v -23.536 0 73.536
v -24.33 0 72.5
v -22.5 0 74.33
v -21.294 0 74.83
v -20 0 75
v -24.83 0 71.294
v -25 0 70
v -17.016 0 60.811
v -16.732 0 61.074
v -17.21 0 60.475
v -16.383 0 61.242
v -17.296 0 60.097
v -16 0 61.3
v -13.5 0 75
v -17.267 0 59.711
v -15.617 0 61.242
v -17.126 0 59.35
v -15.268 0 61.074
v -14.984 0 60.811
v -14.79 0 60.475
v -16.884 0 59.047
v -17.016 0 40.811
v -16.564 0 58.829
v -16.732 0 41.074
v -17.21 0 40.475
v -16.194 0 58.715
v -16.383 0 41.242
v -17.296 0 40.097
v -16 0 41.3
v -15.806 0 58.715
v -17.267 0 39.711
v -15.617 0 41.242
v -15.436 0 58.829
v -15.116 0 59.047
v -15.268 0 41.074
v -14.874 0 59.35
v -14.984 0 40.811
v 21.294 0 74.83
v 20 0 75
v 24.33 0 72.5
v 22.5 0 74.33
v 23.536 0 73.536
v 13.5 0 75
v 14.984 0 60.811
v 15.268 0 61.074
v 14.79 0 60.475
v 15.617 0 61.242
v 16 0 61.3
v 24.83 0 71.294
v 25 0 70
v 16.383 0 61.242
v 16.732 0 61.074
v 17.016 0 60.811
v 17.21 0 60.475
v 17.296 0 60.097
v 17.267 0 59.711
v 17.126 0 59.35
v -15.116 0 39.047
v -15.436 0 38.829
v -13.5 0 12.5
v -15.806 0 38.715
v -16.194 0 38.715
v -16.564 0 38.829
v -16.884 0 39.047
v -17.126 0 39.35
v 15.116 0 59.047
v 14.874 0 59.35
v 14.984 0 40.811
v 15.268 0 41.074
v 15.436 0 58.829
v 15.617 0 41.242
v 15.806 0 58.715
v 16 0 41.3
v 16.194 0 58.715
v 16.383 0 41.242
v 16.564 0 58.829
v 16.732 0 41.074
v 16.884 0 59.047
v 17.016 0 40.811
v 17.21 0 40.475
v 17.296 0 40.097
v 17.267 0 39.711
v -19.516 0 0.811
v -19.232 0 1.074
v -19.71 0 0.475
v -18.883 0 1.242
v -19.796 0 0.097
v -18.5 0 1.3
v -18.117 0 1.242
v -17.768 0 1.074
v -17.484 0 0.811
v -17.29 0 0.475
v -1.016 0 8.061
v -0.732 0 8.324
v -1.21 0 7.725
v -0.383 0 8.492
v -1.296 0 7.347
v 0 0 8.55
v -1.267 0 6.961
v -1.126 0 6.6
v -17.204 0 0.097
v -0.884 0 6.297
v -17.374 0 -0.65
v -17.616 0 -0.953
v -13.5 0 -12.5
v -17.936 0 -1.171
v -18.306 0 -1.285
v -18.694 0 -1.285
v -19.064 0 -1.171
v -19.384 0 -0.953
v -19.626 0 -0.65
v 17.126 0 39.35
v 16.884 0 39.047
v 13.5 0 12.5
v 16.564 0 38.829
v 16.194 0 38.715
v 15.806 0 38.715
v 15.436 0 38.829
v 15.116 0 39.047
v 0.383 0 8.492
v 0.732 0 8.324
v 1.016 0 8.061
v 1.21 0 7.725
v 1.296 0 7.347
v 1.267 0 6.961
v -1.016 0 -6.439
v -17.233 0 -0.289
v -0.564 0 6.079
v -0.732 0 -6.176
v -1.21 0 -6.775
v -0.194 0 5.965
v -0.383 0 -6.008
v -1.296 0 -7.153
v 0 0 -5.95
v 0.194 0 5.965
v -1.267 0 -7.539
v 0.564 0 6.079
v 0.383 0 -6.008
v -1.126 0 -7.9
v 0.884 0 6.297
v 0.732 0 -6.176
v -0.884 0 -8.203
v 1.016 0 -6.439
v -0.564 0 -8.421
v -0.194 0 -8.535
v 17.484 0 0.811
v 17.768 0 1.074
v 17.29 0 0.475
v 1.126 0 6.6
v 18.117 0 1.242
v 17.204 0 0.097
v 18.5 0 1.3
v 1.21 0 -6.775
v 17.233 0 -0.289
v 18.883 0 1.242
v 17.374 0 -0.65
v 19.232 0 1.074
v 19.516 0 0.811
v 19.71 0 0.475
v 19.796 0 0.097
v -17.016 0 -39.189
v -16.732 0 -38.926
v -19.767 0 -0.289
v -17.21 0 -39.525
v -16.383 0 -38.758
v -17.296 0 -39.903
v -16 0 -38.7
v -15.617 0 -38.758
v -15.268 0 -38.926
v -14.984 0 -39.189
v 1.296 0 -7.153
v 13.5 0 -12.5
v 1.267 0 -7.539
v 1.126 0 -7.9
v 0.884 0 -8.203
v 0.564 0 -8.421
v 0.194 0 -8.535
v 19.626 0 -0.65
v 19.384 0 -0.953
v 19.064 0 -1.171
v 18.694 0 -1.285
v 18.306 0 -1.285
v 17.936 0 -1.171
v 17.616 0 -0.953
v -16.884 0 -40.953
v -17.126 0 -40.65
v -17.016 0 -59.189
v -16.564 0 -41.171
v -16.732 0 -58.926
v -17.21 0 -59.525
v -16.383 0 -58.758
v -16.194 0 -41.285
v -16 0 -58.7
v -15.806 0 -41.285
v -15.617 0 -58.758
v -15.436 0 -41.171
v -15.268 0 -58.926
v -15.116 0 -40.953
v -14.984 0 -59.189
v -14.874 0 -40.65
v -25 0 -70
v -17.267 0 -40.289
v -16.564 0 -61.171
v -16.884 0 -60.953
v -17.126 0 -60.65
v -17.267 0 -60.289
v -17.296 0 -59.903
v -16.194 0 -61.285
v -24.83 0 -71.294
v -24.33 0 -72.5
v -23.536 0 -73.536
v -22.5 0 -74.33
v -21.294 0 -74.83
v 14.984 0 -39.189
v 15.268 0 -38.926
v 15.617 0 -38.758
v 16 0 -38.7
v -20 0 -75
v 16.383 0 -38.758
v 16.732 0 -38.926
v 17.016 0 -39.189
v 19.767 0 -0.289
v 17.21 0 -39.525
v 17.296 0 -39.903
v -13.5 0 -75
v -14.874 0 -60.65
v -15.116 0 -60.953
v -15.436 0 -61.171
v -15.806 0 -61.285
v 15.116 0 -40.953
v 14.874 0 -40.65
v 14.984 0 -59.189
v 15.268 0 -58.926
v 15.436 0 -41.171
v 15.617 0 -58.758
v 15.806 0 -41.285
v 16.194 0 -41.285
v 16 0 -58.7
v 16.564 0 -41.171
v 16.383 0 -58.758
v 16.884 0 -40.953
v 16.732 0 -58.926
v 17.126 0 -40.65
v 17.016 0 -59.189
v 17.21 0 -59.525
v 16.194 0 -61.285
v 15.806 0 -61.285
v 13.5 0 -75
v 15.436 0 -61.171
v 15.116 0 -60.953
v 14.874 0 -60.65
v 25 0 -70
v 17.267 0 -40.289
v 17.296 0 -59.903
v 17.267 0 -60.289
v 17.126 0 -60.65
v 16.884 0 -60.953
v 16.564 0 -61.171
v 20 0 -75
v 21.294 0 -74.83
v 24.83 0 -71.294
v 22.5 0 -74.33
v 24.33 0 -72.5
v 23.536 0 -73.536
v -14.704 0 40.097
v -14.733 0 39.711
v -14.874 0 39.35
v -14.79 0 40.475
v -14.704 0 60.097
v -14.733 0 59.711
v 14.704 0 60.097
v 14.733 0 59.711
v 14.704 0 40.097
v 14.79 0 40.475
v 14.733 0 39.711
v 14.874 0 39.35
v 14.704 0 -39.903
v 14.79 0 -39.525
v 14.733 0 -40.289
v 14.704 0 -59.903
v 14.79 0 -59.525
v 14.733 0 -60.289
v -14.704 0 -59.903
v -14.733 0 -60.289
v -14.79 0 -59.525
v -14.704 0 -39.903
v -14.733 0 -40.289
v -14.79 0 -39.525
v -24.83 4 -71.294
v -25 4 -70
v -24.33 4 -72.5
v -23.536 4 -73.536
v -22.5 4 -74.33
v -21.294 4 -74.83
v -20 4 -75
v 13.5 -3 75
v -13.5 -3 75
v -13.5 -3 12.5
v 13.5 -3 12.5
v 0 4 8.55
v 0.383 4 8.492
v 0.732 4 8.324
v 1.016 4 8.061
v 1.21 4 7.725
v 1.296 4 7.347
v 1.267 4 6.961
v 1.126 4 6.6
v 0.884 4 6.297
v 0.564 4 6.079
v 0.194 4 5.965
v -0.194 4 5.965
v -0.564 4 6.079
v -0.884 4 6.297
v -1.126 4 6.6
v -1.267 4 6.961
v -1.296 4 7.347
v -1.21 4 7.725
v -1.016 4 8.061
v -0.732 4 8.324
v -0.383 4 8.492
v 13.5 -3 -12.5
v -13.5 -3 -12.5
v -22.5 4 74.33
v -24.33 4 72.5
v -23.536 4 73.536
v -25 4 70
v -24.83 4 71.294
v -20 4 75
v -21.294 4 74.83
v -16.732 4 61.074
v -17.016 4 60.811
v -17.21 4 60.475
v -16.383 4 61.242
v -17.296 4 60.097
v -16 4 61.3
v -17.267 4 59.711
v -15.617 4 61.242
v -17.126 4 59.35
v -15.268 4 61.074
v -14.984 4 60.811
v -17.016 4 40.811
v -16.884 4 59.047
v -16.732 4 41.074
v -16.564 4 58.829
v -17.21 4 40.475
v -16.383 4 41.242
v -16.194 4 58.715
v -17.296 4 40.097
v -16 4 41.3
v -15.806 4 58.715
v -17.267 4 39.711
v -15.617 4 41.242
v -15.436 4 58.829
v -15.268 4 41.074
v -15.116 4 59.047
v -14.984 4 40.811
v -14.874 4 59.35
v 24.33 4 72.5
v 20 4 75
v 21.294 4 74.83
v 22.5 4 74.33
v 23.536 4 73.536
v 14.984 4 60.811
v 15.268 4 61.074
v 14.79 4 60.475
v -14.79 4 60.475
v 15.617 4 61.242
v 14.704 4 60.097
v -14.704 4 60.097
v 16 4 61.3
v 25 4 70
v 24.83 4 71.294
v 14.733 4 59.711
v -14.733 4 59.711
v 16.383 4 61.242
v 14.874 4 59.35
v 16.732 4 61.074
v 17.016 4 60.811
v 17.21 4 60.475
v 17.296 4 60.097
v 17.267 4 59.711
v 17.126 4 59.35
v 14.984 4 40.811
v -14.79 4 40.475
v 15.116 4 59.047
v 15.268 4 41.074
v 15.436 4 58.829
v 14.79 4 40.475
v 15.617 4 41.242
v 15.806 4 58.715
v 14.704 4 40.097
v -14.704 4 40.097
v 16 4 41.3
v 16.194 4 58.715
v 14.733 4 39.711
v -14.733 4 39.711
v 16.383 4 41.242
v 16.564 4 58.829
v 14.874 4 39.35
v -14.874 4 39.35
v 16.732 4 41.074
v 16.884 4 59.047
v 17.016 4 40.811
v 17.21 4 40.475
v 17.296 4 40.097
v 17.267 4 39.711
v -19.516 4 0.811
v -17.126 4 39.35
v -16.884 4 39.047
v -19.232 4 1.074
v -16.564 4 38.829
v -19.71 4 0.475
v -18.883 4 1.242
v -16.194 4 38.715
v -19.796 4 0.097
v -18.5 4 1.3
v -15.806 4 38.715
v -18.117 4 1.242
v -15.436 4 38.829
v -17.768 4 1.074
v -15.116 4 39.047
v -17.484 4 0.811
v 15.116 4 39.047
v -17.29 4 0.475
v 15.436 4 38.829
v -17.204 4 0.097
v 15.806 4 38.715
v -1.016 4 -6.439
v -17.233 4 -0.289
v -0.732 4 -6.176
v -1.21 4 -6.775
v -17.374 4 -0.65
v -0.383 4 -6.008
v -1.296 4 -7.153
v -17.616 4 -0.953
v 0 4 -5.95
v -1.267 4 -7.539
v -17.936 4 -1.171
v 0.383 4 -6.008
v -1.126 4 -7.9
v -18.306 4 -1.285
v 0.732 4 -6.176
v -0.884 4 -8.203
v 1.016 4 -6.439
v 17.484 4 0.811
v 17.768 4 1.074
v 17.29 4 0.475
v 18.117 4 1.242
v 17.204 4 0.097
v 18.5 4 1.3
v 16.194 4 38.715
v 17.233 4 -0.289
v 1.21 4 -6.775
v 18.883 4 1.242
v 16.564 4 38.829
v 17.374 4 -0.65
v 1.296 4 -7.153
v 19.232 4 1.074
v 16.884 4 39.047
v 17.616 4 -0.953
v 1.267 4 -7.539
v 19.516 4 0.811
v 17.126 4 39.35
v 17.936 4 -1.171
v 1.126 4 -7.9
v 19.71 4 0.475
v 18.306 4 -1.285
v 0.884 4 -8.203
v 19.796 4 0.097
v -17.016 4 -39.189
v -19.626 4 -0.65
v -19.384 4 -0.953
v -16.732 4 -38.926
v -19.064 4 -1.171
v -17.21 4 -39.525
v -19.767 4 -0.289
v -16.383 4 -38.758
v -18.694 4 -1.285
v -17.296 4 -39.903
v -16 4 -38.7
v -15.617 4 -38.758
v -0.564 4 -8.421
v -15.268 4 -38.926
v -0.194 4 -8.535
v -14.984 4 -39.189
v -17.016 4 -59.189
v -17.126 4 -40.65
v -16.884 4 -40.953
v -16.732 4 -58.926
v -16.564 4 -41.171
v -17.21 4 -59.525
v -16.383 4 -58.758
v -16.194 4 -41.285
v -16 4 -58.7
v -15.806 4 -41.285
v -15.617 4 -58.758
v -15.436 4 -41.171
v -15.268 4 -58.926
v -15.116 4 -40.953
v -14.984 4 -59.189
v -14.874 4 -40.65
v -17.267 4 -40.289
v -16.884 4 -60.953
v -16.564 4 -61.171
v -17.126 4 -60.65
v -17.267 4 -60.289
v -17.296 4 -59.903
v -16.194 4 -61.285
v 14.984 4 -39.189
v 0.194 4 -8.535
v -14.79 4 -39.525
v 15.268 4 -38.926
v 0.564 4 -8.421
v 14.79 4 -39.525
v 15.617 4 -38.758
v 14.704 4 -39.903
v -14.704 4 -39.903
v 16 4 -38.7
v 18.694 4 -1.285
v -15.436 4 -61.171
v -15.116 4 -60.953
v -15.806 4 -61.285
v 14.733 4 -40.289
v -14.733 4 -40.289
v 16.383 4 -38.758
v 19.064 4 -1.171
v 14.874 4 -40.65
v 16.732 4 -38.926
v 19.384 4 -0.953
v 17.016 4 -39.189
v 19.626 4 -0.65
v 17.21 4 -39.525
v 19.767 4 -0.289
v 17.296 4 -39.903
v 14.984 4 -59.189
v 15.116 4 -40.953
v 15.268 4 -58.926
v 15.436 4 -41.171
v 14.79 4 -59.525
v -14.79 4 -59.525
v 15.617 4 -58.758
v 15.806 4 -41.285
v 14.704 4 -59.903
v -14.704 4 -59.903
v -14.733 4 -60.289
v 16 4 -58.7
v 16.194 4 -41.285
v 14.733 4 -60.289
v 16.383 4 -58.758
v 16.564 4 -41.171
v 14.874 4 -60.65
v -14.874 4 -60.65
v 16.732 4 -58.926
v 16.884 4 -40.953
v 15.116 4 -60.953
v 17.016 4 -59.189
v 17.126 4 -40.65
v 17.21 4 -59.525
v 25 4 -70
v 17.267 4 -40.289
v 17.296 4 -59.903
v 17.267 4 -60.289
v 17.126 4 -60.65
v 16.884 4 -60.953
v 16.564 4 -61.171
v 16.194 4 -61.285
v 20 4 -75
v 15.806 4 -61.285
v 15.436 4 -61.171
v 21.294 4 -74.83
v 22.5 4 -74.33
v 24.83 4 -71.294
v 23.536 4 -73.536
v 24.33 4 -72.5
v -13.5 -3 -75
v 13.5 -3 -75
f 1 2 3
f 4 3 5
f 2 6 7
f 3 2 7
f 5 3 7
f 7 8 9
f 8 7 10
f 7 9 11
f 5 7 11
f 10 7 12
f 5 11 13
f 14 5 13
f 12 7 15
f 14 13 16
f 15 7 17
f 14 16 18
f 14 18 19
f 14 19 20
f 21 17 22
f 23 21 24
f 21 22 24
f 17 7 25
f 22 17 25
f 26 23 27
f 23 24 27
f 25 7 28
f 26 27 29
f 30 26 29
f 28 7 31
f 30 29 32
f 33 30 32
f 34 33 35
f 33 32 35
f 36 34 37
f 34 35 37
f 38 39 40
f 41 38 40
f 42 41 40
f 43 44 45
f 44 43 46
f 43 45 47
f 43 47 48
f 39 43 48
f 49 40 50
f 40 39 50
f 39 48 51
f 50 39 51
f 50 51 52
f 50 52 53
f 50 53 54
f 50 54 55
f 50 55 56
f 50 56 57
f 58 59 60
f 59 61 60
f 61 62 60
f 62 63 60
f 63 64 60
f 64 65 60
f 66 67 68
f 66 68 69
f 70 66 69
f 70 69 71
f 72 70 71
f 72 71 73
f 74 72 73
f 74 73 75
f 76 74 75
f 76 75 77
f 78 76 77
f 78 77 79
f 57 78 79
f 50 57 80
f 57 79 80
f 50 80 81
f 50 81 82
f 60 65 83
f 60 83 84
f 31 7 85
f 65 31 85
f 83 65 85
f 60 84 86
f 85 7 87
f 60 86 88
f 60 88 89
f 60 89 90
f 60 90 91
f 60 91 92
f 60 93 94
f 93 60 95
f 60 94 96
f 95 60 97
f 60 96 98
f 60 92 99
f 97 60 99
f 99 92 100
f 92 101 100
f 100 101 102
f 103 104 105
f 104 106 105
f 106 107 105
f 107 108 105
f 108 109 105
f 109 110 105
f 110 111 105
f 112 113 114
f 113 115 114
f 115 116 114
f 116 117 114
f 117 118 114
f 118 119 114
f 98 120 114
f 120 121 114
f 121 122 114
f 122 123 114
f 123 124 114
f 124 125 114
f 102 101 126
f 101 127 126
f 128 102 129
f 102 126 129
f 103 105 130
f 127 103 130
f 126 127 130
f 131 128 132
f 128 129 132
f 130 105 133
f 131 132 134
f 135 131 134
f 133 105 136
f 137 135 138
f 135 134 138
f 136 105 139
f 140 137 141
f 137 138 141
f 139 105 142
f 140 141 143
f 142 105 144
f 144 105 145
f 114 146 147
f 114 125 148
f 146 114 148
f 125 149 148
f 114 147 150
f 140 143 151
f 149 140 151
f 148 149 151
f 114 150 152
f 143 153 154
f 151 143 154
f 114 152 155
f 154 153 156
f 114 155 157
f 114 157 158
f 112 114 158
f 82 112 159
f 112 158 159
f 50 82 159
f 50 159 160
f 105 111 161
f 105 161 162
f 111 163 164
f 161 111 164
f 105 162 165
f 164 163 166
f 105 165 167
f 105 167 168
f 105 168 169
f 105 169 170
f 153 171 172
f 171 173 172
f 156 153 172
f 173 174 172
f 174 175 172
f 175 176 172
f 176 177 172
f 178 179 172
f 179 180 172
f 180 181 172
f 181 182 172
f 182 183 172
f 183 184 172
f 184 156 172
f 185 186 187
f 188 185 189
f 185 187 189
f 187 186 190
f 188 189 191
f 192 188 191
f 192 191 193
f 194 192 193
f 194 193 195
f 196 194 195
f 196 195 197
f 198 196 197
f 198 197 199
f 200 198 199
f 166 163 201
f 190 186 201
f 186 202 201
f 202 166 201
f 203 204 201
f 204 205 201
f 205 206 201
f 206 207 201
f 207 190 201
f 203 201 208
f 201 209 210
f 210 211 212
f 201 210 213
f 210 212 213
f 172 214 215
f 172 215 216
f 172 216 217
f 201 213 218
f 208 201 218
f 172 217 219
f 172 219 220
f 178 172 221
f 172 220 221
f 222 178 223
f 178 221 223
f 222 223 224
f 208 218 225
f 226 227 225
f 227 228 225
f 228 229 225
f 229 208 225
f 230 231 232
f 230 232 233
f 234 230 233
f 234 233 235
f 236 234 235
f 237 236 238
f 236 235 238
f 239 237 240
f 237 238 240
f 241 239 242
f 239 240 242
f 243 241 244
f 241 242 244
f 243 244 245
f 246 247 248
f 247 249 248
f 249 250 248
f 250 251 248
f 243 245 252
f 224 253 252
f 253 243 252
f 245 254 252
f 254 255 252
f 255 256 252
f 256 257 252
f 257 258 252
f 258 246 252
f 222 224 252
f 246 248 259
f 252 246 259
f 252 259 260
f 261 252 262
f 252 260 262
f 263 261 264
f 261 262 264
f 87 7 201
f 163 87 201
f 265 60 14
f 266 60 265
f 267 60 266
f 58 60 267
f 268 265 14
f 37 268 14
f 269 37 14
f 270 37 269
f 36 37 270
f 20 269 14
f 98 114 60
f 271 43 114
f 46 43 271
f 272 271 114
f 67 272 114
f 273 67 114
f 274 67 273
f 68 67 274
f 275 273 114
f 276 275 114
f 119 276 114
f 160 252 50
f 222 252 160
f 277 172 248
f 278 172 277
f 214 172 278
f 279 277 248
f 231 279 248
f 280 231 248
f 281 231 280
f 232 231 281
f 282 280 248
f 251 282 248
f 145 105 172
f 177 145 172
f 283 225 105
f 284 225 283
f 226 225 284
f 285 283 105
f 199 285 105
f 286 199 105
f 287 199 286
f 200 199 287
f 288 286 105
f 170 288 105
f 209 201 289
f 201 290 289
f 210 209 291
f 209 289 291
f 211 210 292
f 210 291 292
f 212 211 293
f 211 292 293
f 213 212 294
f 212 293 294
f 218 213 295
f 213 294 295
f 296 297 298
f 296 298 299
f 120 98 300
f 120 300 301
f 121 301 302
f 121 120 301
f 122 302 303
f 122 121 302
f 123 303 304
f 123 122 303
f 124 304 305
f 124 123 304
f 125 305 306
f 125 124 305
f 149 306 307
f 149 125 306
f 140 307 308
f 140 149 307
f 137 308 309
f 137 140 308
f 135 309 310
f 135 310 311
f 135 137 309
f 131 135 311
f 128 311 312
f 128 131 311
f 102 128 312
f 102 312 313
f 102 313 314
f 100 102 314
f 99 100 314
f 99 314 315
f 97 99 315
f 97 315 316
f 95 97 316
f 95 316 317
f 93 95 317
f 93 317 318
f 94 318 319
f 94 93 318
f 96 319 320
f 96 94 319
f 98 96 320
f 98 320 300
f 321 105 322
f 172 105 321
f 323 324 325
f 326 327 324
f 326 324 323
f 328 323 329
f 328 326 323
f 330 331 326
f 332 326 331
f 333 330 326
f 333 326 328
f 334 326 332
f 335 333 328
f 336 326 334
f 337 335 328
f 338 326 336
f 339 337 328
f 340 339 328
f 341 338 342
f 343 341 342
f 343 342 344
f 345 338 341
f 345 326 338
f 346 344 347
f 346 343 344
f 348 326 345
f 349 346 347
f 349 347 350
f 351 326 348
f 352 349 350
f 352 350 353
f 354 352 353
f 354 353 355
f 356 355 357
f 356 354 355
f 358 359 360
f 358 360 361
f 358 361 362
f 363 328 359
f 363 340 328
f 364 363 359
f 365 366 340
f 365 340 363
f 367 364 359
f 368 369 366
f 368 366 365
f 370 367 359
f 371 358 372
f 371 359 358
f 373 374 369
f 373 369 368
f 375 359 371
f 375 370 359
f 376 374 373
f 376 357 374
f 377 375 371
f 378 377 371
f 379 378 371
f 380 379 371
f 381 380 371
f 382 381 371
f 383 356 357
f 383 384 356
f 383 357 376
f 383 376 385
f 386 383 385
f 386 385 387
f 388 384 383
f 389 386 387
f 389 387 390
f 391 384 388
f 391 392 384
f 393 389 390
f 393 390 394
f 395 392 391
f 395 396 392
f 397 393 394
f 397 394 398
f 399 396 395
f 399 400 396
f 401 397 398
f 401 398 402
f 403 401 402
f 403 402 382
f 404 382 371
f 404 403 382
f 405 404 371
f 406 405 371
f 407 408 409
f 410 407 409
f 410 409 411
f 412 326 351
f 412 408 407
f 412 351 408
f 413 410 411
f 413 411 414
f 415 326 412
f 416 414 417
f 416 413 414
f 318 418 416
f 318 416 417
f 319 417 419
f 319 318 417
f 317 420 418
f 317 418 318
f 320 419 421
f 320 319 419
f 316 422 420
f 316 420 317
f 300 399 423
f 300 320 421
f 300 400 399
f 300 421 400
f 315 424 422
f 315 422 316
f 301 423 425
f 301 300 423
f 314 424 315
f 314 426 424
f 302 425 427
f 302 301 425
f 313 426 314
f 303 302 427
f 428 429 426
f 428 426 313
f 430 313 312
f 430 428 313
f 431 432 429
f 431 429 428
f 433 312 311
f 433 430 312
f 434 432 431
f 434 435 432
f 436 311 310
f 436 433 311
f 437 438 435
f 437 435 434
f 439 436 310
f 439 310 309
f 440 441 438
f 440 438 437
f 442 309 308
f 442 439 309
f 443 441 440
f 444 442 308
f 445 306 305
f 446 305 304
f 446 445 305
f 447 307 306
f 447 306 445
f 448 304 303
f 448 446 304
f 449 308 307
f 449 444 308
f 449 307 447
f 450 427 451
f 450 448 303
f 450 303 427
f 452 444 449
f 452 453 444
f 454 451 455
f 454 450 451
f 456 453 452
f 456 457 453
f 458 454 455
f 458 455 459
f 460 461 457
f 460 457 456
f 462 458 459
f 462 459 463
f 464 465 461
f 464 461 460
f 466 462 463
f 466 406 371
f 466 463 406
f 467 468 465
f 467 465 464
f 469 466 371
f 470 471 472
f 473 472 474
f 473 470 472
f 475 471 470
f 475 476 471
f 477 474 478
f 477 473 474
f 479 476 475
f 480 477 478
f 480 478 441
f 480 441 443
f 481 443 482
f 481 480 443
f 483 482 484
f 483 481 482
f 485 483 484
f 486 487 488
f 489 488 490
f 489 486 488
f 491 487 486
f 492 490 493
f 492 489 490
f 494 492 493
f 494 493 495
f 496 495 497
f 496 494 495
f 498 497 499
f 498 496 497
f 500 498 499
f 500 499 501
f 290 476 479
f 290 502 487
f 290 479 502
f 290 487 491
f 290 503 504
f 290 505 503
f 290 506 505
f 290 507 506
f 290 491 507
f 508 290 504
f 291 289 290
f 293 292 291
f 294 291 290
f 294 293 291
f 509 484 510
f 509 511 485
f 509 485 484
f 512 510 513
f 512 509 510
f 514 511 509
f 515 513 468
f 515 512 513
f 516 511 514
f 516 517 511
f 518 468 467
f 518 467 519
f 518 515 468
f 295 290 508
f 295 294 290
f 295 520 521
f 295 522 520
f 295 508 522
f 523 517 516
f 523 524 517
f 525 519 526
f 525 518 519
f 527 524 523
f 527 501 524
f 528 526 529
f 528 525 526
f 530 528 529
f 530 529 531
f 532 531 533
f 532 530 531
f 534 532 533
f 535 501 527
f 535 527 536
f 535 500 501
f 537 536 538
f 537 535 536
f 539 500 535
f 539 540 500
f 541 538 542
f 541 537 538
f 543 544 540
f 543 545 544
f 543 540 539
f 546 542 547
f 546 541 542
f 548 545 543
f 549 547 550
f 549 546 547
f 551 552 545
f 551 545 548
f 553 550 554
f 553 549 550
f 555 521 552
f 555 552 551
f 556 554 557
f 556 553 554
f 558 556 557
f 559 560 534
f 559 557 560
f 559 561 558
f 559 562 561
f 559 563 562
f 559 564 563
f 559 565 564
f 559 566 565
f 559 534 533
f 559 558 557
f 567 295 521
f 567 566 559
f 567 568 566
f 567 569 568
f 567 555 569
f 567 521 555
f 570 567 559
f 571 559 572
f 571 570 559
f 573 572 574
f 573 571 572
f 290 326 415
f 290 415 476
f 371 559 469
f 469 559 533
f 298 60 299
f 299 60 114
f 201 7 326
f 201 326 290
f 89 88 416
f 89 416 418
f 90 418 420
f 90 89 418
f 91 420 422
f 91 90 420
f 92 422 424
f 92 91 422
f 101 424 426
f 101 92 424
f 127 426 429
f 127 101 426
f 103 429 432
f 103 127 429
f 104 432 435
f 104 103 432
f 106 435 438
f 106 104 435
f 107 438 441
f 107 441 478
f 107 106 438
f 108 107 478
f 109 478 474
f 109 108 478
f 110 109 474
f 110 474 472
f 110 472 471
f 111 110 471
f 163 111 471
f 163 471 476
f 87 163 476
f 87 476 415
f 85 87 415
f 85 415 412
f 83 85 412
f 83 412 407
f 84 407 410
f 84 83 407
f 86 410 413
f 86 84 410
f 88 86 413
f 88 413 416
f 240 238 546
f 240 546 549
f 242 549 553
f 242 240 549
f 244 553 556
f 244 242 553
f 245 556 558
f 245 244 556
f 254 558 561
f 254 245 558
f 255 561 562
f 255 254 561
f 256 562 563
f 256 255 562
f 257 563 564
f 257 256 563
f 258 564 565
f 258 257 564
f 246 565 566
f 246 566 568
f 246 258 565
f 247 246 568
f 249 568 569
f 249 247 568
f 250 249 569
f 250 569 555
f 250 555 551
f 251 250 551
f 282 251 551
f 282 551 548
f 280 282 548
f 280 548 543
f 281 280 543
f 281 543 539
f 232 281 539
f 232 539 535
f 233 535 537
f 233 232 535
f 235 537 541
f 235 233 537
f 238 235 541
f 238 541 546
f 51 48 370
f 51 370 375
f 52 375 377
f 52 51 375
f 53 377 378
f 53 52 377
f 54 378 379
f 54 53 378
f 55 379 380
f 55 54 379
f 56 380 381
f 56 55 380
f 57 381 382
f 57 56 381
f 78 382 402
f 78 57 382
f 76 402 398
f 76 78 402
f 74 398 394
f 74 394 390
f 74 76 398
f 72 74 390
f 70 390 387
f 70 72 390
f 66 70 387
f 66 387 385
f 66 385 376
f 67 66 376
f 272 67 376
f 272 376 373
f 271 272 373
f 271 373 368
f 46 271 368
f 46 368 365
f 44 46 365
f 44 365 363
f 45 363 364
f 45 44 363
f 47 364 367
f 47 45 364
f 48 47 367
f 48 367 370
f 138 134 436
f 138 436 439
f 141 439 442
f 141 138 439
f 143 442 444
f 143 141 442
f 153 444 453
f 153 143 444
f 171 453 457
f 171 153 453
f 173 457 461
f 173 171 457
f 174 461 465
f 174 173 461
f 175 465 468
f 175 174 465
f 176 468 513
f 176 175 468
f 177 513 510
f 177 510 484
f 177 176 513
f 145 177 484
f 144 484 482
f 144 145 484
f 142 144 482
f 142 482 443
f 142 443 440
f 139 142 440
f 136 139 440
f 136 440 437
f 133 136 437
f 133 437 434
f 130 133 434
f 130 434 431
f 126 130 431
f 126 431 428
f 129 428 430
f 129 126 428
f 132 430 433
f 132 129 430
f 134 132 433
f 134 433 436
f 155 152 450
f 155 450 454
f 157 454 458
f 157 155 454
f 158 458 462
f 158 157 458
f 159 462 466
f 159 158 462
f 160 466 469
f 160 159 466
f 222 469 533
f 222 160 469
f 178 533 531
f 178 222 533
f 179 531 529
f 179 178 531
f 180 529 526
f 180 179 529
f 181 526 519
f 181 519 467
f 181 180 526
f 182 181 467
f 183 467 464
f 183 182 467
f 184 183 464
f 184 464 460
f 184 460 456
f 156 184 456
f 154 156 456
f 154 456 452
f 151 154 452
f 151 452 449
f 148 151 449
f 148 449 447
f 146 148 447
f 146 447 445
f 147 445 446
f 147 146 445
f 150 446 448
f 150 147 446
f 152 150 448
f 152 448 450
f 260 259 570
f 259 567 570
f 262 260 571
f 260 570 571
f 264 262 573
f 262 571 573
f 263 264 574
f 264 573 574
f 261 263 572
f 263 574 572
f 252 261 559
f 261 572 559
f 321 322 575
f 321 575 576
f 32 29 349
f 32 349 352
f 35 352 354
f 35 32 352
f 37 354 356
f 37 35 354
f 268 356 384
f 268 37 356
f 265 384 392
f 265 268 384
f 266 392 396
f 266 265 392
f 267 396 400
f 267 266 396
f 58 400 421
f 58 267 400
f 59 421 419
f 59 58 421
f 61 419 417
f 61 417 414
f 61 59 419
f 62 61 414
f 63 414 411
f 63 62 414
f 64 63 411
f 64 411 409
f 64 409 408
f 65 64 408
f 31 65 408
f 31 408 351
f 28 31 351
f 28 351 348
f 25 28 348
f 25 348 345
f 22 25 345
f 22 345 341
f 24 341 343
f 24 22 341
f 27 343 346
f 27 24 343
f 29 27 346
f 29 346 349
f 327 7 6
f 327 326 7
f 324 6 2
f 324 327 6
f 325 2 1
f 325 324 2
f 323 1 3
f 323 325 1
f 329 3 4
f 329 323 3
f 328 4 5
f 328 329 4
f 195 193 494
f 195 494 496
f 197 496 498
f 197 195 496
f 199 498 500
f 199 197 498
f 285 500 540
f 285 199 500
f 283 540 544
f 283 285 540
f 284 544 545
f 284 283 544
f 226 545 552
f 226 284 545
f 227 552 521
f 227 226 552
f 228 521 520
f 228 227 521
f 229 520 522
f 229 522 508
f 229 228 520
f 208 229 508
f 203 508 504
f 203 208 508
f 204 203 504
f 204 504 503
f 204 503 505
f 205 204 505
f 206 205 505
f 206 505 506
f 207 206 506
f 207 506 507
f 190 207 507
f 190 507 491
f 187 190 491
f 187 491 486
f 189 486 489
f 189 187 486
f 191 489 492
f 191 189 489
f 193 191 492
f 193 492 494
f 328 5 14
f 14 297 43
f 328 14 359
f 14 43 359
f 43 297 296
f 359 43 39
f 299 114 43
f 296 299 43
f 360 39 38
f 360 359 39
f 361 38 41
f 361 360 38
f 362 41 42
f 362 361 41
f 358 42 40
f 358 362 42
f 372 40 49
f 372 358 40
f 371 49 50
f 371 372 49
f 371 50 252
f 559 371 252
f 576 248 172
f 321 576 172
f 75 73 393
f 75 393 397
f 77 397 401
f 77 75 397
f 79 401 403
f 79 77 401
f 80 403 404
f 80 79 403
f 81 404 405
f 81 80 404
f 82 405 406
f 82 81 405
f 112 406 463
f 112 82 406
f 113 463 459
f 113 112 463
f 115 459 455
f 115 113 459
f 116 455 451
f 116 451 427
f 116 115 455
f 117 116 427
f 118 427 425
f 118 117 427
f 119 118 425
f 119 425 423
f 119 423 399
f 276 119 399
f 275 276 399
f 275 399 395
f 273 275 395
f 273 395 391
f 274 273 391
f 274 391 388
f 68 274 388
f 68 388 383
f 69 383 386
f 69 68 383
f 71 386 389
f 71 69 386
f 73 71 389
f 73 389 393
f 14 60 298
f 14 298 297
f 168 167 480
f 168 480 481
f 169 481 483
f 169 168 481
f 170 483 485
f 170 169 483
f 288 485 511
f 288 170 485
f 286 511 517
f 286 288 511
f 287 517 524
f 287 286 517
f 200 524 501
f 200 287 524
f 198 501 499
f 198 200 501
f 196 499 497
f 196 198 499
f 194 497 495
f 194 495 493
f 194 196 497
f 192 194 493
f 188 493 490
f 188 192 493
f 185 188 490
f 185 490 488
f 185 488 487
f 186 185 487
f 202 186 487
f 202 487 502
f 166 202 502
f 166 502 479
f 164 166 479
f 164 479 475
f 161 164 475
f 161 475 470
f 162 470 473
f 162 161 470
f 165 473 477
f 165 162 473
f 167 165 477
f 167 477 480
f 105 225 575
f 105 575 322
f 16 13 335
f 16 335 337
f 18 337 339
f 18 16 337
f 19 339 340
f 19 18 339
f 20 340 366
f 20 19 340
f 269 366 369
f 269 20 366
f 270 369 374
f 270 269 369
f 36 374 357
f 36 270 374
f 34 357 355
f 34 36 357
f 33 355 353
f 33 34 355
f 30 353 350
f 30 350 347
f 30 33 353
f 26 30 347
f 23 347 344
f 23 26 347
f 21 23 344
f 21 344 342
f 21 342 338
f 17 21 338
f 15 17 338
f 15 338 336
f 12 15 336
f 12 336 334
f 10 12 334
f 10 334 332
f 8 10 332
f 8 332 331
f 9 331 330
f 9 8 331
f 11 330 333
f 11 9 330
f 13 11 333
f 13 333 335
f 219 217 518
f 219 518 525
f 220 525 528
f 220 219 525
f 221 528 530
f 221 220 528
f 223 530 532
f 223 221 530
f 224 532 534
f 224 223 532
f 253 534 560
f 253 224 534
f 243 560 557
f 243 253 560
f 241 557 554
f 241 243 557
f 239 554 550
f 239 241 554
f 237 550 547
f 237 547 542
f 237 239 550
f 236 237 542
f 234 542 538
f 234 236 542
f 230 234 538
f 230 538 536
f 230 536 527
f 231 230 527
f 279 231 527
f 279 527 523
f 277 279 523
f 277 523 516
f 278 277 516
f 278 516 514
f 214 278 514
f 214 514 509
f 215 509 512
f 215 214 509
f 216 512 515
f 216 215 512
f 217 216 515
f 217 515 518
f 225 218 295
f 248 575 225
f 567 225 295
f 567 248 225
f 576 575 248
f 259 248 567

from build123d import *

# Parameters (mm, degrees)
SKETCH_1_W      = 50
SKETCH_1_H      = 150
SKETCH_1_R      = 1.3
EXTRUDE_1_DEPTH = 4
SKETCH_3_W      = 27
SKETCH_3_H      = 62.5
EXTRUDE_2_DEPTH = 3
FILLET_1_R      = 5


with BuildPart() as part:
    # 草图1 → 凸台-拉伸1 (new body)
    with BuildSketch(Plane(origin=(0, 0, 0), x_dir=(1, 0, 0), z_dir=(0, 1, 0))):
        Rectangle(SKETCH_1_W, SKETCH_1_H)
        with Locations(Location((0, 7.25, 0), (0, 0, 270))):
            Circle(SKETCH_1_R, mode=Mode.SUBTRACT)
        with Locations(Location((0, -7.25, 0), (0, 0, 270))):
            Circle(SKETCH_1_R, mode=Mode.SUBTRACT)
        with Locations(Location((-18.5, 0, 0), (0, 0, 270))):
            Circle(SKETCH_1_R, mode=Mode.SUBTRACT)
        with Locations(Location((18.5, 0, 0), (0, 0, 270))):
            Circle(SKETCH_1_R, mode=Mode.SUBTRACT)
        with Locations(Location((-16, -40, 0), (0, 0, 270))):
            Circle(SKETCH_1_R, mode=Mode.SUBTRACT)
        with Locations(Location((16, -40, 0), (0, 0, 270))):
            Circle(SKETCH_1_R, mode=Mode.SUBTRACT)
        with Locations(Location((-16, -60, 0), (0, 0, 270))):
            Circle(SKETCH_1_R, mode=Mode.SUBTRACT)
        with Locations(Location((16, -60, 0), (0, 0, 270))):
            Circle(SKETCH_1_R, mode=Mode.SUBTRACT)
        with Locations(Location((-16, 40, 0), (0, 0, 270))):
            Circle(SKETCH_1_R, mode=Mode.SUBTRACT)
        with Locations(Location((16, 40, 0), (0, 0, 270))):
            Circle(SKETCH_1_R, mode=Mode.SUBTRACT)
        with Locations(Location((-16, 60, 0), (0, 0, 270))):
            Circle(SKETCH_1_R, mode=Mode.SUBTRACT)
        with Locations(Location((16, 60, 0), (0, 0, 270))):
            Circle(SKETCH_1_R, mode=Mode.SUBTRACT)
    extrude(amount=EXTRUDE_1_DEPTH)

    # 草图3 → 凸台-拉伸2 (add)
    with BuildSketch(Plane.XZ):
        with Locations((0, 43.75)):
            Rectangle(SKETCH_3_W, SKETCH_3_H)
        with Locations((0, -43.75)):
            Rectangle(SKETCH_3_W, SKETCH_3_H)
    extrude(amount=EXTRUDE_2_DEPTH)

    # 圆角1
    fillet_1_edges = [part.edges().sort_by_distance(p)[0] for p in [
        (25, 2, 75),
        (-25, 2, 75),
        (-25, 2, -75),
        (25, 2, -75),
    ]]
    fillet(fillet_1_edges, radius=FILLET_1_R)


solid = part.part
